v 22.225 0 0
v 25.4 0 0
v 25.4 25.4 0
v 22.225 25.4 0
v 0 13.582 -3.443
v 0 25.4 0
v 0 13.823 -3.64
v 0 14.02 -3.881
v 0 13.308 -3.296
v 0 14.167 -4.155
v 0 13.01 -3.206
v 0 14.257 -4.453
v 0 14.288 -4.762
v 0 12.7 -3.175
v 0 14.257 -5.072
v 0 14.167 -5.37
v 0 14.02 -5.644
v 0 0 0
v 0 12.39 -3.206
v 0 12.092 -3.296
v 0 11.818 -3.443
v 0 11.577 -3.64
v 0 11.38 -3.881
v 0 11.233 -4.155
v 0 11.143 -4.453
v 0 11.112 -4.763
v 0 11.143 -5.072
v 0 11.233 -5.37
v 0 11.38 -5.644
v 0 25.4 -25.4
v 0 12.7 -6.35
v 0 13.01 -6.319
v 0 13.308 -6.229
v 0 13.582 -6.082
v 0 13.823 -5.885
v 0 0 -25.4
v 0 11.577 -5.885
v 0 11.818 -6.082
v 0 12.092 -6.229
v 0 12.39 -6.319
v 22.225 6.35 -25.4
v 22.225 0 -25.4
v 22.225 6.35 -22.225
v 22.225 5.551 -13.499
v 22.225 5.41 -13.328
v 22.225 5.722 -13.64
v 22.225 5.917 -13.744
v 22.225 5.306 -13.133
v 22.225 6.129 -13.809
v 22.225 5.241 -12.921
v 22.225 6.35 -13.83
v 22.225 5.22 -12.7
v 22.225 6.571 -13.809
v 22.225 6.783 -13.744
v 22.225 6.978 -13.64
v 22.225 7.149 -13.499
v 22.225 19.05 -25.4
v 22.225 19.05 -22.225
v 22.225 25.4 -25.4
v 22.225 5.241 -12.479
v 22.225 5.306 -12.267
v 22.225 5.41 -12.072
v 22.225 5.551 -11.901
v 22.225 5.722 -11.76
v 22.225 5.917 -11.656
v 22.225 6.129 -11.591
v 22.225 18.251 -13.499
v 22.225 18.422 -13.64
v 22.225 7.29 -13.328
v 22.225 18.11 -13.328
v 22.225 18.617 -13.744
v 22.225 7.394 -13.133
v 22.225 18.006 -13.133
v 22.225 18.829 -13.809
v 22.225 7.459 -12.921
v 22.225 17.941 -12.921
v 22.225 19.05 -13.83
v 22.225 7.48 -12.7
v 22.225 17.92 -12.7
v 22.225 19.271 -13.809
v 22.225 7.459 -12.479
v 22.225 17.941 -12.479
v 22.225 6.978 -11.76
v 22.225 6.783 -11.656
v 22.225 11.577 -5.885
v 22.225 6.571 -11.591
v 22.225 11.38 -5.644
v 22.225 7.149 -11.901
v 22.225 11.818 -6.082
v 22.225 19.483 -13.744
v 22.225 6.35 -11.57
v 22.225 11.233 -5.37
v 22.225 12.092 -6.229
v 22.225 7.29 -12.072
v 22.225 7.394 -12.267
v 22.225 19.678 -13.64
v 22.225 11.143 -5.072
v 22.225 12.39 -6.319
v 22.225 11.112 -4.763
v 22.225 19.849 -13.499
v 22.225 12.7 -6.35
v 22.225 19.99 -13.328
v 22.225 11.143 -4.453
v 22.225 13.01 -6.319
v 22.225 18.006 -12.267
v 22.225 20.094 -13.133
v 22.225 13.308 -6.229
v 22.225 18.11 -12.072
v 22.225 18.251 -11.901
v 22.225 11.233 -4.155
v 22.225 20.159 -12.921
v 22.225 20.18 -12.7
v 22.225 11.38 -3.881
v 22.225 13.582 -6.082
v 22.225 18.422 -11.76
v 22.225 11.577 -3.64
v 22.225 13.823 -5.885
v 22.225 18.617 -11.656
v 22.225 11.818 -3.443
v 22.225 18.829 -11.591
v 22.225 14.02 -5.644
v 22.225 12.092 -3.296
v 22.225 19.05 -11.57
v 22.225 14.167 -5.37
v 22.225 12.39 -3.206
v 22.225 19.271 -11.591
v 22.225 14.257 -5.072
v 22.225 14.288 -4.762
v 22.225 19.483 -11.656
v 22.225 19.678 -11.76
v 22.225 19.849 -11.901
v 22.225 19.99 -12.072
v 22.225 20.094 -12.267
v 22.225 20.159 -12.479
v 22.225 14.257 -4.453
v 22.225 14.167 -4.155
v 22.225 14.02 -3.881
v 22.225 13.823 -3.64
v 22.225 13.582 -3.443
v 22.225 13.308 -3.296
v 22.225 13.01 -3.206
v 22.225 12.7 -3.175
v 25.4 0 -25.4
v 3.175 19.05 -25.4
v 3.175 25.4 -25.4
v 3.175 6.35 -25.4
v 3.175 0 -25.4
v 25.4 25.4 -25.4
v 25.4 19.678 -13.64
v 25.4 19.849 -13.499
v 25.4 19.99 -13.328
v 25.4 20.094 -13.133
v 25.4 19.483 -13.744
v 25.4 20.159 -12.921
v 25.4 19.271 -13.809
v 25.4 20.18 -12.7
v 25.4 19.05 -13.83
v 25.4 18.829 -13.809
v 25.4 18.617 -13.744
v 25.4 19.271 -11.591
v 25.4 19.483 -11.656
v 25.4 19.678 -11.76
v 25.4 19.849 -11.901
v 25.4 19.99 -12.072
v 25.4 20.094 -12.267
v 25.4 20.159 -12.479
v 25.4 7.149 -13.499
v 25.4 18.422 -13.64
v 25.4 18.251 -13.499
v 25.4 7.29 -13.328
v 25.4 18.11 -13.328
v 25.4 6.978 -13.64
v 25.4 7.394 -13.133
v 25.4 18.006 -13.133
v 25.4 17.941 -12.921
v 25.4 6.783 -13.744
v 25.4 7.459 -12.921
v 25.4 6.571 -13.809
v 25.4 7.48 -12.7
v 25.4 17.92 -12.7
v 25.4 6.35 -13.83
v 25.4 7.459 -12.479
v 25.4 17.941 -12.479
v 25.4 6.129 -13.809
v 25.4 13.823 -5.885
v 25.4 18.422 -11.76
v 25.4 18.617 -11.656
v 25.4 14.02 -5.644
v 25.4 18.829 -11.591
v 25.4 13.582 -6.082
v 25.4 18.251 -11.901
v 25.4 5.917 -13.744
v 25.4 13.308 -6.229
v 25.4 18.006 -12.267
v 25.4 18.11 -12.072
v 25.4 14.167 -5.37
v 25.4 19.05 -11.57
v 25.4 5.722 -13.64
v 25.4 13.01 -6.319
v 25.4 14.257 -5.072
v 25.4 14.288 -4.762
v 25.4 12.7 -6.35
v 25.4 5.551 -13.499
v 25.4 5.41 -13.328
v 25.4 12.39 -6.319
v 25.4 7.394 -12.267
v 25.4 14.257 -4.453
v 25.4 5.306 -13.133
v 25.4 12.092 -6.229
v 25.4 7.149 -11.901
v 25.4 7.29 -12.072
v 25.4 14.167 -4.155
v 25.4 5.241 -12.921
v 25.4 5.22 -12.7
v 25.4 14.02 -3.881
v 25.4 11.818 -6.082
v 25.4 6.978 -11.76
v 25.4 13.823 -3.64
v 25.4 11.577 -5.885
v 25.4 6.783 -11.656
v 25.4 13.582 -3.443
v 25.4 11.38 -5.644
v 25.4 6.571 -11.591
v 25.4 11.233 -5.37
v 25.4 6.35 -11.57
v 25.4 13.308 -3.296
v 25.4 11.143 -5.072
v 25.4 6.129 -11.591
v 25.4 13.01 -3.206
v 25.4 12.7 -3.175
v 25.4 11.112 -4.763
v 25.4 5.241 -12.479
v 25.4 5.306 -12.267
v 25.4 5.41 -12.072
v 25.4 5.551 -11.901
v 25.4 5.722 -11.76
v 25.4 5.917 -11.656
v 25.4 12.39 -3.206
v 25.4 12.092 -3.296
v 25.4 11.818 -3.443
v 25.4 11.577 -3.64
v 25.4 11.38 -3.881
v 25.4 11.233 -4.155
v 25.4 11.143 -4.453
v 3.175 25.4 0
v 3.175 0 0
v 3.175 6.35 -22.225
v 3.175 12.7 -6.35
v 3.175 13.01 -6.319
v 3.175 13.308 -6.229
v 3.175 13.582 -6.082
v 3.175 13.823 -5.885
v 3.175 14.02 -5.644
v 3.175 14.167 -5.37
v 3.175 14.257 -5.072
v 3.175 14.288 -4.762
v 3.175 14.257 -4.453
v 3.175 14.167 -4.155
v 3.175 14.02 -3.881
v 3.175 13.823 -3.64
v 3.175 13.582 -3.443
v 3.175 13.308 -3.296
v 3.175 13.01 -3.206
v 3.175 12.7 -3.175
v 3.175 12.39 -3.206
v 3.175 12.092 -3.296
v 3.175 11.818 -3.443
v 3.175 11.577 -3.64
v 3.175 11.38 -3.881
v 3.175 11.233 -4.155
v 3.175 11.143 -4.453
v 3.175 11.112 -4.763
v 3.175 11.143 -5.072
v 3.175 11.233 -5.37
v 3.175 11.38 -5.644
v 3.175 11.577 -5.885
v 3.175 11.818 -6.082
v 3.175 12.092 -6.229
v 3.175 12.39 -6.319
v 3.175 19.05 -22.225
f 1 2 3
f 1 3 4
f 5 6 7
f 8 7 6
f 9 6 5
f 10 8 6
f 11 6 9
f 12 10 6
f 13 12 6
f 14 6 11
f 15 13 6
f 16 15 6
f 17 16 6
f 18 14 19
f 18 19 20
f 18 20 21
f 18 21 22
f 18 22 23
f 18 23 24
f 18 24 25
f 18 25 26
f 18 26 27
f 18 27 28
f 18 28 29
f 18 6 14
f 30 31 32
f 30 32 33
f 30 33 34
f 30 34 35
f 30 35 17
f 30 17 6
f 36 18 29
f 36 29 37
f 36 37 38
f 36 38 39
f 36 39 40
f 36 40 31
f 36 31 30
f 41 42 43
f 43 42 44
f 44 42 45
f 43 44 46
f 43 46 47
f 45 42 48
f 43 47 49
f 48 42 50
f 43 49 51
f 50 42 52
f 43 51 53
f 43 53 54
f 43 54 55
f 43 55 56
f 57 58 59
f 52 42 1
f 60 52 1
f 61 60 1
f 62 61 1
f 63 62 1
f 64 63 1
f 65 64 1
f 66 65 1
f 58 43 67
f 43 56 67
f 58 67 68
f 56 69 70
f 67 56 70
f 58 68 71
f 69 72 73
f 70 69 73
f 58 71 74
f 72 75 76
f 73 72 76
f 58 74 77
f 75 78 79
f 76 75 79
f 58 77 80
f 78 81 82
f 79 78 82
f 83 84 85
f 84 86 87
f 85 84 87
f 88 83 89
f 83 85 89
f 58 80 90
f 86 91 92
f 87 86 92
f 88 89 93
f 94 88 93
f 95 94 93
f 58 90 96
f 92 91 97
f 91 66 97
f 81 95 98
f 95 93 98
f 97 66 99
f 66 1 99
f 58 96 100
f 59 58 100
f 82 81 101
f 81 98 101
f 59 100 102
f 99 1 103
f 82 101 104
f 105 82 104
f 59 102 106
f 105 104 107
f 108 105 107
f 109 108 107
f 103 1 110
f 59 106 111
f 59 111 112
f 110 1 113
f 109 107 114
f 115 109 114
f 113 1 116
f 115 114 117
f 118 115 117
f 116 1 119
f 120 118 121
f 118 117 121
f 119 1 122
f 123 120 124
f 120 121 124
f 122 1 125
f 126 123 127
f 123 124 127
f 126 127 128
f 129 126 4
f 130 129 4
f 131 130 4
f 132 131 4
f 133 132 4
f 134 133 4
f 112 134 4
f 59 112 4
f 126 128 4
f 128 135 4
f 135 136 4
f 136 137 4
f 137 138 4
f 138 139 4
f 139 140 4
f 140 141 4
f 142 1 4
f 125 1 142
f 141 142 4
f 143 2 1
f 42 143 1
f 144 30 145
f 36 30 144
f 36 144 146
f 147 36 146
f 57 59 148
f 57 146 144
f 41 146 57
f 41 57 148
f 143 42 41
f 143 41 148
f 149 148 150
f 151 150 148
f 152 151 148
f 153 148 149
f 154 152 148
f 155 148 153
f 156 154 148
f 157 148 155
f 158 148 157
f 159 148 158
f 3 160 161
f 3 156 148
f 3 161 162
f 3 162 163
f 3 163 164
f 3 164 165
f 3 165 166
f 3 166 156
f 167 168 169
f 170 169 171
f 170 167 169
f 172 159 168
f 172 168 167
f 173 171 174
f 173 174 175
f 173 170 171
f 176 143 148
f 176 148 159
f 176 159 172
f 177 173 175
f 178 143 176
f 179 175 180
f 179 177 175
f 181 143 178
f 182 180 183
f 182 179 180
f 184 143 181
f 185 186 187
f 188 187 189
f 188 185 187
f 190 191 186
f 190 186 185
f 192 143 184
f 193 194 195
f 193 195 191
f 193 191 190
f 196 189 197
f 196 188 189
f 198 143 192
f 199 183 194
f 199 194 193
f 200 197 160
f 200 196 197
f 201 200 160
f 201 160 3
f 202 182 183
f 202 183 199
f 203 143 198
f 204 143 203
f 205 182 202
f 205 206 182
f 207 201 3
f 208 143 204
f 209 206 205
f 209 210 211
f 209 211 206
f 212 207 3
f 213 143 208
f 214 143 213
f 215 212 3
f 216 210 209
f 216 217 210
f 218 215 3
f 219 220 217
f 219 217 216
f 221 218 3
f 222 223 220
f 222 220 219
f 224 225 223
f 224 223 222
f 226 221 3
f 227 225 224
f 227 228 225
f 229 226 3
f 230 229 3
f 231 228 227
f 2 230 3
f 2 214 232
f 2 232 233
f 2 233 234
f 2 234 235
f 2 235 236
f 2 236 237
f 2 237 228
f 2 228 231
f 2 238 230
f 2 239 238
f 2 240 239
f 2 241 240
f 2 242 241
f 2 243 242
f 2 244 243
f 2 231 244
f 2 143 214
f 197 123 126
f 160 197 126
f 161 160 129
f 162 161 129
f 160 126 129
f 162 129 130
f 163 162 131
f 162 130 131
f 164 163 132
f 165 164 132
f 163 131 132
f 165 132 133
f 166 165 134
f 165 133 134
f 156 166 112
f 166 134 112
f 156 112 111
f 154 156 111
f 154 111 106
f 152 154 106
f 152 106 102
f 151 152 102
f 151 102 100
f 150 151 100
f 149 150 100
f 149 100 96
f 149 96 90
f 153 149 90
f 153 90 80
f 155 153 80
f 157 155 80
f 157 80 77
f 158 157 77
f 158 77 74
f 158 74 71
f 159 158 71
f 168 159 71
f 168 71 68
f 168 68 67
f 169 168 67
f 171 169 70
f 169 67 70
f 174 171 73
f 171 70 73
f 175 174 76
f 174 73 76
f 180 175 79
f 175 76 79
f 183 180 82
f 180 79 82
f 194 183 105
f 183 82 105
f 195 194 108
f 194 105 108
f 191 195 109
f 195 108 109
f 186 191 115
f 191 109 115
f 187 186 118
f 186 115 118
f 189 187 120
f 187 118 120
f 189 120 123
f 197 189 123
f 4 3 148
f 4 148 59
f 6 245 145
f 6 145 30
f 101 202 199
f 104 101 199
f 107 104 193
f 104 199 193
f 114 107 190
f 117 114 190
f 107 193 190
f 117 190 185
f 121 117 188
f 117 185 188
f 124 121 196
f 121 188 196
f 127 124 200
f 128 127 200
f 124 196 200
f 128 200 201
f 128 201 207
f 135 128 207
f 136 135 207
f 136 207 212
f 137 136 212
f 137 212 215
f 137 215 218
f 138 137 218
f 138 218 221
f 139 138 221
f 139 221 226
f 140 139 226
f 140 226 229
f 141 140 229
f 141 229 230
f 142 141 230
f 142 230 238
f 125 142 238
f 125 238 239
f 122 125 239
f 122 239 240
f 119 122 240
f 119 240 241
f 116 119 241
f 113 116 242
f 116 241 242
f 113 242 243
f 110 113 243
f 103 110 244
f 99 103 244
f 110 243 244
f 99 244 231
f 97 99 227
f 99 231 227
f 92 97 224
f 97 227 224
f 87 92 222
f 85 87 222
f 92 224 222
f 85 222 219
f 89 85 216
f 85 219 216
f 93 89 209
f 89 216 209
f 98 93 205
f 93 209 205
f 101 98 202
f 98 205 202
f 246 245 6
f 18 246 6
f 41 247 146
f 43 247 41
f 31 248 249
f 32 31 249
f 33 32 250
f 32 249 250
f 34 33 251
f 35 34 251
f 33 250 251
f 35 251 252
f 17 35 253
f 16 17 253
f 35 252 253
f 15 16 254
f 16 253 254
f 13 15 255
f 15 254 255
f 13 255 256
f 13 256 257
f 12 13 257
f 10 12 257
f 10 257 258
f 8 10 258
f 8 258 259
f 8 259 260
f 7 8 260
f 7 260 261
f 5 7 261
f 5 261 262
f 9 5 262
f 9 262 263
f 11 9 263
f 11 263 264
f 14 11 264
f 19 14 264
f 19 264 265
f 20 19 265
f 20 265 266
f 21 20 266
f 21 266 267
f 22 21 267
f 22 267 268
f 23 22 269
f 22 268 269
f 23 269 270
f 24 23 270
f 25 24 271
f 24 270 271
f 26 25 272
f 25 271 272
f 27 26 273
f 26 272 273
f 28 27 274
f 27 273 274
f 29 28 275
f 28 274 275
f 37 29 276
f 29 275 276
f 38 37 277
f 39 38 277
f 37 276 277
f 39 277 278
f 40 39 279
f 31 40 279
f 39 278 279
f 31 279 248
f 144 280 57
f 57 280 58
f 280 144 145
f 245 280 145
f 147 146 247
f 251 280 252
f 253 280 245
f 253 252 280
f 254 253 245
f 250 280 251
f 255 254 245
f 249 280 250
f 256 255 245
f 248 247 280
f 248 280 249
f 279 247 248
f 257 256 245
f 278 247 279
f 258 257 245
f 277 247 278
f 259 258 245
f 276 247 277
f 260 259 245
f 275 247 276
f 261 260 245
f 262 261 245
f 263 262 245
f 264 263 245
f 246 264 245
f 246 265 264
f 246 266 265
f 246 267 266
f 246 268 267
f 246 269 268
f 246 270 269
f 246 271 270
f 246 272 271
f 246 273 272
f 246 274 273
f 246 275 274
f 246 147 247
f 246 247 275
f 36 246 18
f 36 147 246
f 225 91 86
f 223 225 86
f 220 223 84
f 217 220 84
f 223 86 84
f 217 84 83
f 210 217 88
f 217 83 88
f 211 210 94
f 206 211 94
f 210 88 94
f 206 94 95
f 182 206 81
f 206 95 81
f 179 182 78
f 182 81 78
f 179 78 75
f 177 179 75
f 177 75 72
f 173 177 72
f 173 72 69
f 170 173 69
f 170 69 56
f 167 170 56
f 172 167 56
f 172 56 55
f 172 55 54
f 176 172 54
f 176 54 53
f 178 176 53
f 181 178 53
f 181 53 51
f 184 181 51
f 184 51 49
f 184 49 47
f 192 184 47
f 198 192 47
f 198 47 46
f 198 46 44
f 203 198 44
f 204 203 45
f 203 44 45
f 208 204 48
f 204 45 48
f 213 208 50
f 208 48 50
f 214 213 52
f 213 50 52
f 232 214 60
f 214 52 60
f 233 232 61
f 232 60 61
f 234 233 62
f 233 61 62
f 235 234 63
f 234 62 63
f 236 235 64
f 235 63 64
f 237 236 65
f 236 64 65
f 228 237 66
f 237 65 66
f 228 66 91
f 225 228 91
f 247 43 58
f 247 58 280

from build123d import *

# Parameters (mm, degrees)
BOSS_EXTRUDE1_DEPTH             = 25.4
F_1_8_0_125_DIAMETER_HOLE1_D    = 3.175
F_43_0_089_DIAMETER_HOLE2_D     = 2.2606
F_43_0_089_DIAMETER_HOLE2_DEPTH = 3.175
CUT_EXTRUDE1_REACH              = 44.241
SKETCH8_W                       = 19.05
SKETCH8_H                       = 6.35


with BuildPart() as part:
    # Sketch1 → Boss-Extrude1 (new body)
    with BuildSketch(Plane(origin=(0, 0, 0), x_dir=(1, 0, 0), z_dir=(0, 1, 0))):
        Polygon((0, 0), (0, 25.4), (25.4, 25.4), (25.4, 0), (22.225, 0), (22.225, 22.225), (3.175, 22.225), (3.175, 0), align=None)
    extrude(amount=BOSS_EXTRUDE1_DEPTH)

    # 1/8 (0.125) Diameter Hole1 (through all)
    with Locations(Plane.ZY):
        with Locations((-4.7625, 12.7)):
            Hole(F_1_8_0_125_DIAMETER_HOLE1_D / 2)

    # #43 (0.089) Diameter Hole2
    with Locations(Plane(origin=(25.4, 0, 0), x_dir=(0, 0, -1), z_dir=(1, 0, 0))):
        with Locations((12.7, 19.05), (12.7, 6.35)):
            Hole(F_43_0_089_DIAMETER_HOLE2_D / 2, depth=F_43_0_089_DIAMETER_HOLE2_DEPTH)

    # Sketch8 → Cut-Extrude1 (cut, up to next)
    with BuildSketch(Plane.XY.offset(-22.225), mode=Mode.PRIVATE) as cut_extrude1_sk1:
        with Locations((12.7, 22.225)):
            Rectangle(SKETCH8_W, SKETCH8_H)
    cut_extrude1_tool1 = extrude(cut_extrude1_sk1.sketch, amount=-CUT_EXTRUDE1_REACH, mode=Mode.PRIVATE) & part.part
    # Sketch8 → Cut-Extrude1 (cut, up to next)
    with BuildSketch(Plane.XY.offset(-22.225), mode=Mode.PRIVATE) as cut_extrude1_sk2:
        with Locations((12.7, 3.175)):
            Rectangle(SKETCH8_W, SKETCH8_H)
    cut_extrude1_tool2 = extrude(cut_extrude1_sk2.sketch, amount=-CUT_EXTRUDE1_REACH, mode=Mode.PRIVATE) & part.part
    add(cut_extrude1_tool1.solids().sort_by_distance((12.7, 22.225, -22.225))[0], mode=Mode.SUBTRACT)
    add(cut_extrude1_tool2.solids().sort_by_distance((12.7, 3.175, -22.225))[0], mode=Mode.SUBTRACT)


solid = part.part
